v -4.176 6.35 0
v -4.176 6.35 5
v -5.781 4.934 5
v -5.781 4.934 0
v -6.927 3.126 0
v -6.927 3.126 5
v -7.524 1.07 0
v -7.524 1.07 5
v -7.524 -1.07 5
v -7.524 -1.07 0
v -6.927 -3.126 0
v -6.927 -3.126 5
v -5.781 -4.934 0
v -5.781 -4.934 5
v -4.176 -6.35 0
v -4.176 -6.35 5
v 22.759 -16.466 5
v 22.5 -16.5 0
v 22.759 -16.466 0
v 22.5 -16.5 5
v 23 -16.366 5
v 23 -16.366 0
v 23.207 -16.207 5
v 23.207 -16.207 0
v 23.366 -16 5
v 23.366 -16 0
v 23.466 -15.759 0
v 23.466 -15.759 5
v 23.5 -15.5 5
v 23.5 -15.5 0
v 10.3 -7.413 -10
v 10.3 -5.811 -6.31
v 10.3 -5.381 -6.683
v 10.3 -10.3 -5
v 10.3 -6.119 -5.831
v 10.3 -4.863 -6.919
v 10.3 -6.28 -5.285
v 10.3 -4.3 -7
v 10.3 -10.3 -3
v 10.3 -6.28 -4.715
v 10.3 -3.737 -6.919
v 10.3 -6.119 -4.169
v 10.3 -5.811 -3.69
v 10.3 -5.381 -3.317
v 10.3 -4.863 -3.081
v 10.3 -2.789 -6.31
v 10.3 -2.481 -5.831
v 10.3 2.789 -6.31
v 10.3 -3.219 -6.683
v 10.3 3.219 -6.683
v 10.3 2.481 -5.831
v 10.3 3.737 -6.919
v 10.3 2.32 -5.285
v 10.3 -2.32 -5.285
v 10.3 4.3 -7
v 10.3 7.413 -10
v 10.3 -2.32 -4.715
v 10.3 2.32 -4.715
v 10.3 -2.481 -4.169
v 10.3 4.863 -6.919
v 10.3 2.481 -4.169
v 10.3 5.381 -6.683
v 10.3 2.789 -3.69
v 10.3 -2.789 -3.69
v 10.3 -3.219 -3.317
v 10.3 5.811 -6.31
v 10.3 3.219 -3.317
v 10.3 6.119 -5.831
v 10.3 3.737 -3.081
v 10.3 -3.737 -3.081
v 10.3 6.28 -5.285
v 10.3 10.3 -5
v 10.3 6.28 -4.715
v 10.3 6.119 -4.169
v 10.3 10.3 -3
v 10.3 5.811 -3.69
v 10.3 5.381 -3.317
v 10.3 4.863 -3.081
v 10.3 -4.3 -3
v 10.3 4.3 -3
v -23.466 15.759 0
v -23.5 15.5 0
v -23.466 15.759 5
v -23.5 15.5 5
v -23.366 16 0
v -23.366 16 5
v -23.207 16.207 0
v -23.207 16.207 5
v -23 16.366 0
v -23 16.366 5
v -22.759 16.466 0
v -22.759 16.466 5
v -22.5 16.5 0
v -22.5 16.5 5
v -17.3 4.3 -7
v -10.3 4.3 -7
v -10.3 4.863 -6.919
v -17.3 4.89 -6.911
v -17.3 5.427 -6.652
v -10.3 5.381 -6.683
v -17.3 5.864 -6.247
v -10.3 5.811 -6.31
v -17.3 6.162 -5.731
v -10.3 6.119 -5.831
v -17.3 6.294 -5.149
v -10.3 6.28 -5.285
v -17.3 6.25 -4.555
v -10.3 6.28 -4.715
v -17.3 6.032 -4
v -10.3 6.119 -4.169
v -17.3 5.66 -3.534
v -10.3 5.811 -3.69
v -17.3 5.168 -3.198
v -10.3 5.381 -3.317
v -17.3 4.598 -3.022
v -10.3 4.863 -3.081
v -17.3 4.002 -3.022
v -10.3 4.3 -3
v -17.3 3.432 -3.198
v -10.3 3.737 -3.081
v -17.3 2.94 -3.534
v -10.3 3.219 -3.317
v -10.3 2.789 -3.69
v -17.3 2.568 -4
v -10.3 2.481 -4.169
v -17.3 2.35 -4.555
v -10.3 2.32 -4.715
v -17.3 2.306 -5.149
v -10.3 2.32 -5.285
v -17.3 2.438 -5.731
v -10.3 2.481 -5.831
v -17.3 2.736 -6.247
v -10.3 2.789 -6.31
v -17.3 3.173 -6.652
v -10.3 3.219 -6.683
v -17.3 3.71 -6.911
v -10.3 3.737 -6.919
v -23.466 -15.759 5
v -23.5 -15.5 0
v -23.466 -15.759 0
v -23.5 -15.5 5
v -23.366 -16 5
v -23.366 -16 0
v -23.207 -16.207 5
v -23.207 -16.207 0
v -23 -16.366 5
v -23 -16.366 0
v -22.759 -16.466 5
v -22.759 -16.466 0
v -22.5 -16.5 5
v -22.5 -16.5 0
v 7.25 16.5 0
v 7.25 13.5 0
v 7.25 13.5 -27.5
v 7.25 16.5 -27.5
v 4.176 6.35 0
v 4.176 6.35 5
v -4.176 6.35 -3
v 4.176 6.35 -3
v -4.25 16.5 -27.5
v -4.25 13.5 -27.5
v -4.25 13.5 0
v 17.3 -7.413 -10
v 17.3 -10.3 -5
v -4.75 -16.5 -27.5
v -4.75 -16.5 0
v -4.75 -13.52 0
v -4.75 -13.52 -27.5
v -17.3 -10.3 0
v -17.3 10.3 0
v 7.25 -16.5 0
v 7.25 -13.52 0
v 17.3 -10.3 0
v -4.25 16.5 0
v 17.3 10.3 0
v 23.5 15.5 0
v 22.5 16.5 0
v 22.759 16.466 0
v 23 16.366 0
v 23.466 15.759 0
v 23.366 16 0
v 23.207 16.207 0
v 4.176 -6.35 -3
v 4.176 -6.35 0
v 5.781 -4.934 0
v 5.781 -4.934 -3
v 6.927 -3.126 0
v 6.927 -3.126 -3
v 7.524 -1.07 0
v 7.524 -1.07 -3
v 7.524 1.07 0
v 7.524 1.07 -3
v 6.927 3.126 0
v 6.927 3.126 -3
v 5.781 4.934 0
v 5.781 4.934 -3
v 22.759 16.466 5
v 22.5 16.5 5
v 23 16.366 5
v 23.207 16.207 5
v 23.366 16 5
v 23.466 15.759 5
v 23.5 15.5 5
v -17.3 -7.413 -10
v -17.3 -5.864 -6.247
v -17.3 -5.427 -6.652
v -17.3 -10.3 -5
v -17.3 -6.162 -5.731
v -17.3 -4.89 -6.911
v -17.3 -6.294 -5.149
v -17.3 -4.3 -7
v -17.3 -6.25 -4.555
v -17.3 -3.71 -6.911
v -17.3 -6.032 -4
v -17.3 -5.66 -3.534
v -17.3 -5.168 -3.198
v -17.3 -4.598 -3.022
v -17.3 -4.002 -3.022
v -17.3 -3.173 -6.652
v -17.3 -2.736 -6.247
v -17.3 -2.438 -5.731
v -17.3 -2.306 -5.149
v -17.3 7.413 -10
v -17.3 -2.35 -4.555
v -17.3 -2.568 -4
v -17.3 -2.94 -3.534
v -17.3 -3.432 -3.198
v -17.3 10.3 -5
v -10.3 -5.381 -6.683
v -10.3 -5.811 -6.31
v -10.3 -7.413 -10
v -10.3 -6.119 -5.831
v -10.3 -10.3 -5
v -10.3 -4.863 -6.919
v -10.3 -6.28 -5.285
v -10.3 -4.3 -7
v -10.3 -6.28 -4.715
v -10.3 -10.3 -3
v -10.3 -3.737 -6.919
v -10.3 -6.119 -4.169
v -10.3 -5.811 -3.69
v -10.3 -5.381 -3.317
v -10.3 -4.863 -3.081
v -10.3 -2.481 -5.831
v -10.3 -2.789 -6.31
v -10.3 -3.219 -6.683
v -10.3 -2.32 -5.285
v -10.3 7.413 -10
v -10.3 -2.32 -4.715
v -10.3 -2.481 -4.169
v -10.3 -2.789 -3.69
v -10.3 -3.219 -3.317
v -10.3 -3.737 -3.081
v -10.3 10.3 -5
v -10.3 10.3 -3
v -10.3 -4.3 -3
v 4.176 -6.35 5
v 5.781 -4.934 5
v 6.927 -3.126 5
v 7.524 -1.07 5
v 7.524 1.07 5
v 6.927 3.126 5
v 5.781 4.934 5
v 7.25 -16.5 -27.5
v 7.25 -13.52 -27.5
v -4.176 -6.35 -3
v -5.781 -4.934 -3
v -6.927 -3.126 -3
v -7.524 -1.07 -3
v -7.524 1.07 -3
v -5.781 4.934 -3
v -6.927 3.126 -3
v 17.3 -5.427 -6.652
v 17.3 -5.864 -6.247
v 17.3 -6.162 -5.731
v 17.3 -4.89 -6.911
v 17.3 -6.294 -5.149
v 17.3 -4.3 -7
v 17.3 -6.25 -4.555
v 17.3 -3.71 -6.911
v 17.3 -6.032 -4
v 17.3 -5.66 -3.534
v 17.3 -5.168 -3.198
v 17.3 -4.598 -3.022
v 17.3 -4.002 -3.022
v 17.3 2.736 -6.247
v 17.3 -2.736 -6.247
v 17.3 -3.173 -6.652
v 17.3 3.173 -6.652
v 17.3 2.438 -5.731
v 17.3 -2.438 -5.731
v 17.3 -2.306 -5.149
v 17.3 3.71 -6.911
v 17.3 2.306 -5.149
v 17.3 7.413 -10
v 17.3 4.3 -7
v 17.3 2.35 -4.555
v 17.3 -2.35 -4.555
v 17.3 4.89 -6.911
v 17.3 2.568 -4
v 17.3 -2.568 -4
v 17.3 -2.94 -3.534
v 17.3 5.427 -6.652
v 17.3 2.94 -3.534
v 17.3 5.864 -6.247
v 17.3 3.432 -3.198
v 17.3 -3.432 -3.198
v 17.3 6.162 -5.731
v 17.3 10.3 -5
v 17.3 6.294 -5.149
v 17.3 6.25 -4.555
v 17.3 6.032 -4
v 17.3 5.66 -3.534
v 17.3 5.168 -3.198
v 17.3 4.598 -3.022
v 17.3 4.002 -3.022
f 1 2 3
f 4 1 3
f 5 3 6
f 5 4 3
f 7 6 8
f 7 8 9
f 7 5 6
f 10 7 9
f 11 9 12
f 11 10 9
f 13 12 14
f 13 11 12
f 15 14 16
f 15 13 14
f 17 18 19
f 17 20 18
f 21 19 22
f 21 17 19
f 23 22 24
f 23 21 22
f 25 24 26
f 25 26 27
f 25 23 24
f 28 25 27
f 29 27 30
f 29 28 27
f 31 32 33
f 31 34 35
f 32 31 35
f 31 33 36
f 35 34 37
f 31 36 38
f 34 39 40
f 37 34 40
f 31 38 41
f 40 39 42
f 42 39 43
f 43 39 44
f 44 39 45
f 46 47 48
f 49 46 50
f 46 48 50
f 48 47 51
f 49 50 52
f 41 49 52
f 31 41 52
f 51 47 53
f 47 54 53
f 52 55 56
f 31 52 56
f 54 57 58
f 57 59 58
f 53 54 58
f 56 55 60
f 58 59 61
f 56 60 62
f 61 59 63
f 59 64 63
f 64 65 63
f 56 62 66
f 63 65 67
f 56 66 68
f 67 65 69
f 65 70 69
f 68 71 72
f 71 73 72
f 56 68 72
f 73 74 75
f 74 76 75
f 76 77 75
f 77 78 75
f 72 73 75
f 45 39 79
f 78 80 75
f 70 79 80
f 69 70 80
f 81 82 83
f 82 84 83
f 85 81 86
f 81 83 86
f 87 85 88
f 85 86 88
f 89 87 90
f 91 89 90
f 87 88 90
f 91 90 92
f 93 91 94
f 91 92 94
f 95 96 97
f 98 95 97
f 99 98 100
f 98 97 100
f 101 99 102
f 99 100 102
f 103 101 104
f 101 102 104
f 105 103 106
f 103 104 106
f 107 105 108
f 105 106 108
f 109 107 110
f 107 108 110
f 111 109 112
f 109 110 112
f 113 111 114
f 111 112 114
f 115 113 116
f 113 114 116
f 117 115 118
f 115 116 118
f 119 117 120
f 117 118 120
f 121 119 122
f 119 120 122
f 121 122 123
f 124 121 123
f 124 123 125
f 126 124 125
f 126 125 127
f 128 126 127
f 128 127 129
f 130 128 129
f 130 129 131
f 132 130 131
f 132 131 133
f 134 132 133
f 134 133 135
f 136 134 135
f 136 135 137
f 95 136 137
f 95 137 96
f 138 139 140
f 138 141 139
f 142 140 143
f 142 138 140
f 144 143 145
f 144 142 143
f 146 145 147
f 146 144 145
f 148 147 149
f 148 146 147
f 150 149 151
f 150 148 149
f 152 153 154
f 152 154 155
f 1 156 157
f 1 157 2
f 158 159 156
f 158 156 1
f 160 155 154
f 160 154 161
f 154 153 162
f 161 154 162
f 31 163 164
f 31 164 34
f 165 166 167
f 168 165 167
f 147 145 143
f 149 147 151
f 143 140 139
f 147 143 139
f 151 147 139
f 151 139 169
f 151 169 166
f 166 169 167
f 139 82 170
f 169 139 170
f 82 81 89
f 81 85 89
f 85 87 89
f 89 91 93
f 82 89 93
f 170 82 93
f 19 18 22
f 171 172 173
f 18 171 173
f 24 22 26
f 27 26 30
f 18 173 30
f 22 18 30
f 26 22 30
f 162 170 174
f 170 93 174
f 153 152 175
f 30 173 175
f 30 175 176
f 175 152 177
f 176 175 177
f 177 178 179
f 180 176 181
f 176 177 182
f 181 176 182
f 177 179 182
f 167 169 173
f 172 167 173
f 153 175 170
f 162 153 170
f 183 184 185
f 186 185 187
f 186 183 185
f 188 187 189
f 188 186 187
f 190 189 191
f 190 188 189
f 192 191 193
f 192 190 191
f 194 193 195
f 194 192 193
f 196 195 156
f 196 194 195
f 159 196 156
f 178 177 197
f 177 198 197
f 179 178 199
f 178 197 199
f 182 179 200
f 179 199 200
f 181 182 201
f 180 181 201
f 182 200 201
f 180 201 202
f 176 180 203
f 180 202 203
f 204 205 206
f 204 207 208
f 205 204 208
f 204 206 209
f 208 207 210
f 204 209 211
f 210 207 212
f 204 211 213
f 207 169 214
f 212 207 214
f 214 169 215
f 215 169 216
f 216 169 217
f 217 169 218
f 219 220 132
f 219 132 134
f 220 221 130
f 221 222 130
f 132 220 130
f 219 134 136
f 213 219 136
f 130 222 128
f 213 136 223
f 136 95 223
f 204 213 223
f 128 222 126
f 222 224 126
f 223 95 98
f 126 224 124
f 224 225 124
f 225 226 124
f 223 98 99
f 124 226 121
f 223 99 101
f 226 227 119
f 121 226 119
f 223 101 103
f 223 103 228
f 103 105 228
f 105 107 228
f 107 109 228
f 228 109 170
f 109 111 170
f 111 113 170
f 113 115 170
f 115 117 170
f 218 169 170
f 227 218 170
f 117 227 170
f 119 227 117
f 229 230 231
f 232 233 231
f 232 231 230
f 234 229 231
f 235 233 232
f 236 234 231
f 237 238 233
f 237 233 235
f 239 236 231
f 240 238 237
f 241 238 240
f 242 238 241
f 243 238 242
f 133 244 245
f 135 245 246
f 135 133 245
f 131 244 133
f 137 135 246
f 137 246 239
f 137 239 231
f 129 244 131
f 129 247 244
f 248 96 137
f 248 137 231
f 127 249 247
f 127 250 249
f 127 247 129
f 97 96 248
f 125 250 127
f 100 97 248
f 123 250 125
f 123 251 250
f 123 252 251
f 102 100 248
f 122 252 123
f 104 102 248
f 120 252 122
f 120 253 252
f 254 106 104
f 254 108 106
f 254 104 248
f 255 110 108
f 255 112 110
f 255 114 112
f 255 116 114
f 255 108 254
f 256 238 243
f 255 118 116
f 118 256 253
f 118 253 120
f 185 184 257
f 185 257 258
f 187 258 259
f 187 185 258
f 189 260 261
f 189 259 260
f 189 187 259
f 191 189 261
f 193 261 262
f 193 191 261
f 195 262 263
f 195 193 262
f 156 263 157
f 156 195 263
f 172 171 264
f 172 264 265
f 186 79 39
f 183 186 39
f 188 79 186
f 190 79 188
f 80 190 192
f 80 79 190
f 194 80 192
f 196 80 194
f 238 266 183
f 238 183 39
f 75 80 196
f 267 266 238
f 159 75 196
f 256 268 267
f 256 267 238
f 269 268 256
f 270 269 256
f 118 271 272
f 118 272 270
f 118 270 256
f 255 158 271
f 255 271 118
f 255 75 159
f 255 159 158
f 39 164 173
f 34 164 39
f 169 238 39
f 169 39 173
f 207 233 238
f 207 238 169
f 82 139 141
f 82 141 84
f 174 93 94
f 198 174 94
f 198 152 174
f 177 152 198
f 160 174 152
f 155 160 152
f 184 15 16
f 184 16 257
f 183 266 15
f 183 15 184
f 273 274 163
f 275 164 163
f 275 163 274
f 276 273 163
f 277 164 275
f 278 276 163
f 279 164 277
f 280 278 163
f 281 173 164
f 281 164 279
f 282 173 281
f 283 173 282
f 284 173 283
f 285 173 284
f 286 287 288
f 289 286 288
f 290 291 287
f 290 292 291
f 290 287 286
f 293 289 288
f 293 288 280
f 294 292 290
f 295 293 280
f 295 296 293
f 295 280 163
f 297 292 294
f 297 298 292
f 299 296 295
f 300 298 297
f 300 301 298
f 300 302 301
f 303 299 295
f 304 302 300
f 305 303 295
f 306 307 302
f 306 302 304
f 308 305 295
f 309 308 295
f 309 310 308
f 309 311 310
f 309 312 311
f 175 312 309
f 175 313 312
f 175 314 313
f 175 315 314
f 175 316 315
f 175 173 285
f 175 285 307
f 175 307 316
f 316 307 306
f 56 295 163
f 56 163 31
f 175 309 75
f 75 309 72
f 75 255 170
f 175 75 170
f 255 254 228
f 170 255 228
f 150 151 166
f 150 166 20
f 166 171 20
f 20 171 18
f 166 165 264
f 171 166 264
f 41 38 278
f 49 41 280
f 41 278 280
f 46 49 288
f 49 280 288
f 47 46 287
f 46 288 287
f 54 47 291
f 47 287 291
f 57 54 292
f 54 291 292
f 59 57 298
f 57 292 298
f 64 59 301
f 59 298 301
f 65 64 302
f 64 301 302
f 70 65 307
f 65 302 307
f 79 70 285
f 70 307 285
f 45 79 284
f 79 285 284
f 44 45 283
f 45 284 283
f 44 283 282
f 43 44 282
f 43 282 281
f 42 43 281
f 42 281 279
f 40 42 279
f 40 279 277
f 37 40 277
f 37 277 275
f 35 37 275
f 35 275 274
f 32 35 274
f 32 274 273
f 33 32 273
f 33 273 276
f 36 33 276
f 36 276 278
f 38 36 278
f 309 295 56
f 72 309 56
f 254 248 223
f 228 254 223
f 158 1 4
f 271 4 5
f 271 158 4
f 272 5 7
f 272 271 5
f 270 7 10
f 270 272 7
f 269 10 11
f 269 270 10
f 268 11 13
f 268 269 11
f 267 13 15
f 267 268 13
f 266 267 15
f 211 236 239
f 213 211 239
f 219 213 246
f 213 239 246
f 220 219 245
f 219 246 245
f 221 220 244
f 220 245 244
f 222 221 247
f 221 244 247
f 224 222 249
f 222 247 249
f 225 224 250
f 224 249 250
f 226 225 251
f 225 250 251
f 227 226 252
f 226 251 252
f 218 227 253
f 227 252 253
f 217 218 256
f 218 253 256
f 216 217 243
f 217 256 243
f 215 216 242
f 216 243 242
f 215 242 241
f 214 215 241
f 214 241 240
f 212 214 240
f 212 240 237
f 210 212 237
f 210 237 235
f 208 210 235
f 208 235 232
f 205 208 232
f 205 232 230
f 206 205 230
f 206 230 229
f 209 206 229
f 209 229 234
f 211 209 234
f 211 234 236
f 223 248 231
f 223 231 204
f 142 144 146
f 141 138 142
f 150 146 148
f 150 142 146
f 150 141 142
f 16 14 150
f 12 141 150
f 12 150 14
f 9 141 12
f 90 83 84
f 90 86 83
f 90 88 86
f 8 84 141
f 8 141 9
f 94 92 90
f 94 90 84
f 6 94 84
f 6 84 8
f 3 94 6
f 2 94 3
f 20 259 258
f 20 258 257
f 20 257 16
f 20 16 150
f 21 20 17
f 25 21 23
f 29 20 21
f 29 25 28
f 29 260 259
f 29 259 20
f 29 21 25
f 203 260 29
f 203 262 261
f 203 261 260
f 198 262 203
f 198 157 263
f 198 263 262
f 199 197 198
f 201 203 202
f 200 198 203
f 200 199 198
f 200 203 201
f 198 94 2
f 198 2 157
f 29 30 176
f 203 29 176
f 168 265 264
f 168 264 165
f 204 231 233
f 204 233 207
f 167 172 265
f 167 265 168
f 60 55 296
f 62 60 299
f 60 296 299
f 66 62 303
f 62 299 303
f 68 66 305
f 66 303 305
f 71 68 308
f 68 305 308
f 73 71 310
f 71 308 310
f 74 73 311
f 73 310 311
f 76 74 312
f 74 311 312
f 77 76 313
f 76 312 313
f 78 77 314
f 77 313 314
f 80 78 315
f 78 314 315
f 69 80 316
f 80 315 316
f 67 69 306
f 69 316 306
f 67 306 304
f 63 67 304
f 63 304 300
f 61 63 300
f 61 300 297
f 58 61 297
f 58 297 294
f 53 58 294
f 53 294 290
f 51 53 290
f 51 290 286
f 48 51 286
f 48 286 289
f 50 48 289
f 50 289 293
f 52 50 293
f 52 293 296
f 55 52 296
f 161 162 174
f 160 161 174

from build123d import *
from OCP.BRepFilletAPI import BRepFilletAPI_MakeChamfer

# Parameters (mm, degrees)
SZKIC1_W                    = 47
SZKIC1_H                    = 33
SZKIC1_R                    = 7.6
DODANIE_WYCI_GNI_CIE1_DEPTH = 5
SZKIC2_W                    = 7
SZKIC2_H                    = 20.6
DODANIE_WYCI_GNI_CIE2_DEPTH = 10
SFAZOWANIE1_SIZE            = 5
SFAZOWANIE1_SIZE2           = 2.886751346
SZKIC3_R                    = 2
WYTNIJ_WYCI_GNI_CIE1_DEPTH  = 46.131917752
ZAOKR_GLENIE1_R             = 1
SZKIC4_W                    = 11.5
SZKIC4_H                    = 3
SZKIC4_W_2                  = 12
SZKIC4_H_2                  = 2.980259267
DODANIE_WYCI_GNI_CIE3_DEPTH = 27.5
DODANIE_WYCI_GNI_CIE4_START = 3
SZKIC5_W                    = 20.6
SZKIC5_H                    = 20.6
DODANIE_WYCI_GNI_CIE4_DEPTH = 3


with BuildPart() as part:
    # Szkic1 → Dodanie-wyciągnięcie1 (new body)
    # profile 1 of 3: a face of its own
    with BuildSketch(Plane.XY):
        Rectangle(SZKIC1_W, SZKIC1_H)
        Circle(SZKIC1_R, mode=Mode.SUBTRACT)
    # profile 2 of 3: a face of its own
    with BuildSketch(Plane.XY):
        with BuildLine():
            Line((4.175823272, -6.35), (-4.175823272, -6.35))
            ThreePointArc((-4.175823272, -6.35), (0, -7.6), (4.175823272, -6.35))
        make_face()
    # profile 3 of 3: a face of its own
    with BuildSketch(Plane.XY):
        with BuildLine():
            ThreePointArc((4.175823272, 6.35), (0, 7.6), (-4.175823272, 6.35))
            Line((-4.175823272, 6.35), (4.175823272, 6.35))
        make_face()
    extrude(amount=DODANIE_WYCI_GNI_CIE1_DEPTH)

    # Szkic2 → Dodanie-wyciągnięcie2 (add)
    with BuildSketch(Plane(origin=(0, 0, 0), x_dir=(-1, 0, 0), z_dir=(0, 0, -1))):
        with Locations((-13.8, 0)):
            Rectangle(SZKIC2_W, SZKIC2_H)
        with Locations((13.8, 0)):
            Rectangle(SZKIC2_W, SZKIC2_H)
    extrude(amount=DODANIE_WYCI_GNI_CIE2_DEPTH)

    # Sfazowanie1: one chamfer whose edges measure the first distance from different faces: ONE call of the kernel's chamfer builder (chamfer() names one face for all edges)
    sfazowanie1_edges_1 = [part.edges().sort_by_distance(p)[0] for p in [
        (13.8, 10.3, -10),
    ]]
    sfazowanie1_side_1 = [part.faces().sort_by_distance(p)[0] for p in [
        (13.8, 10.3, -5),
    ]]
    sfazowanie1_edges_2 = [part.edges().sort_by_distance(p)[0] for p in [
        (13.8, -10.3, -10),
    ]]
    sfazowanie1_side_2 = [part.faces().sort_by_distance(p)[0] for p in [
        (13.8, -10.3, -5),
    ]]
    sfazowanie1_edges_3 = [part.edges().sort_by_distance(p)[0] for p in [
        (-13.8, 10.3, -10),
    ]]
    sfazowanie1_side_3 = [part.faces().sort_by_distance(p)[0] for p in [
        (-13.8, 10.3, -5),
    ]]
    sfazowanie1_edges_4 = [part.edges().sort_by_distance(p)[0] for p in [
        (-13.8, -10.3, -10),
    ]]
    sfazowanie1_side_4 = [part.faces().sort_by_distance(p)[0] for p in [
        (-13.8, -10.3, -5),
    ]]
    sfazowanie1 = BRepFilletAPI_MakeChamfer(part.part.solid().wrapped)
    for e in sfazowanie1_edges_1:
        sfazowanie1.Add(SFAZOWANIE1_SIZE, SFAZOWANIE1_SIZE2, e.wrapped, sfazowanie1_side_1[0].wrapped)  # the first distance lies on this face
    for e in sfazowanie1_edges_2:
        sfazowanie1.Add(SFAZOWANIE1_SIZE, SFAZOWANIE1_SIZE2, e.wrapped, sfazowanie1_side_2[0].wrapped)  # the first distance lies on this face
    for e in sfazowanie1_edges_3:
        sfazowanie1.Add(SFAZOWANIE1_SIZE, SFAZOWANIE1_SIZE2, e.wrapped, sfazowanie1_side_3[0].wrapped)  # the first distance lies on this face
    for e in sfazowanie1_edges_4:
        sfazowanie1.Add(SFAZOWANIE1_SIZE, SFAZOWANIE1_SIZE2, e.wrapped, sfazowanie1_side_4[0].wrapped)  # the first distance lies on this face
    add(Compound.cast(sfazowanie1.Shape()), mode=Mode.REPLACE)

    # Szkic3 → Wytnij-wyciągnięcie1 (cut, through all)
    with BuildSketch(Plane(origin=(17.3, 0, 0), x_dir=(0, 0, -1), z_dir=(1, 0, 0))):
        with Locations((5, 4.3)):
            Circle(SZKIC3_R)
        with Locations((5, -4.3)):
            Circle(SZKIC3_R)
    extrude(amount=-WYTNIJ_WYCI_GNI_CIE1_DEPTH, mode=Mode.SUBTRACT)

    # Zaokrąglenie1
    zaokr_glenie1_edges = [part.edges().sort_by_distance(p)[0] for p in [
        (-23.5, -16.5, 2.5),
        (-23.5, 16.5, 2.5),
        (23.5, 16.5, 2.5),
        (23.5, -16.5, 2.5),
    ]]
    fillet(zaokr_glenie1_edges, radius=ZAOKR_GLENIE1_R)

    # Szkic4 → Dodanie-wyciągnięcie3 (add)
    with BuildSketch(Plane(origin=(0, 0, 0), x_dir=(-1, 0, 0), z_dir=(0, 0, -1))):
        with Locations((-1.5, 15)):
            Rectangle(SZKIC4_W, SZKIC4_H)
        with Locations((-1.25, -15.009870366)):
            Rectangle(SZKIC4_W_2, SZKIC4_H_2)
    extrude(amount=DODANIE_WYCI_GNI_CIE3_DEPTH)

    # Szkic5 → Dodanie-wyciągnięcie4 (add)
    with BuildSketch(Plane(origin=(0, 0, 0), x_dir=(-1, 0, 0), z_dir=(0, 0, -1)).offset(DODANIE_WYCI_GNI_CIE4_START)):
        Rectangle(SZKIC5_W, SZKIC5_H)
        with BuildLine():
            Line((4.175823272, -6.35), (-4.175823272, -6.35))
            ThreePointArc((-4.175823272, -6.35), (-7.6, 0), (-4.175823272, 6.35))
            Line((-4.175823272, 6.35), (4.175823272, 6.35))
            ThreePointArc((4.175823272, 6.35), (7.6, 0), (4.175823272, -6.35))
        make_face(mode=Mode.SUBTRACT)
    extrude(amount=-DODANIE_WYCI_GNI_CIE4_DEPTH)


solid = part.part
